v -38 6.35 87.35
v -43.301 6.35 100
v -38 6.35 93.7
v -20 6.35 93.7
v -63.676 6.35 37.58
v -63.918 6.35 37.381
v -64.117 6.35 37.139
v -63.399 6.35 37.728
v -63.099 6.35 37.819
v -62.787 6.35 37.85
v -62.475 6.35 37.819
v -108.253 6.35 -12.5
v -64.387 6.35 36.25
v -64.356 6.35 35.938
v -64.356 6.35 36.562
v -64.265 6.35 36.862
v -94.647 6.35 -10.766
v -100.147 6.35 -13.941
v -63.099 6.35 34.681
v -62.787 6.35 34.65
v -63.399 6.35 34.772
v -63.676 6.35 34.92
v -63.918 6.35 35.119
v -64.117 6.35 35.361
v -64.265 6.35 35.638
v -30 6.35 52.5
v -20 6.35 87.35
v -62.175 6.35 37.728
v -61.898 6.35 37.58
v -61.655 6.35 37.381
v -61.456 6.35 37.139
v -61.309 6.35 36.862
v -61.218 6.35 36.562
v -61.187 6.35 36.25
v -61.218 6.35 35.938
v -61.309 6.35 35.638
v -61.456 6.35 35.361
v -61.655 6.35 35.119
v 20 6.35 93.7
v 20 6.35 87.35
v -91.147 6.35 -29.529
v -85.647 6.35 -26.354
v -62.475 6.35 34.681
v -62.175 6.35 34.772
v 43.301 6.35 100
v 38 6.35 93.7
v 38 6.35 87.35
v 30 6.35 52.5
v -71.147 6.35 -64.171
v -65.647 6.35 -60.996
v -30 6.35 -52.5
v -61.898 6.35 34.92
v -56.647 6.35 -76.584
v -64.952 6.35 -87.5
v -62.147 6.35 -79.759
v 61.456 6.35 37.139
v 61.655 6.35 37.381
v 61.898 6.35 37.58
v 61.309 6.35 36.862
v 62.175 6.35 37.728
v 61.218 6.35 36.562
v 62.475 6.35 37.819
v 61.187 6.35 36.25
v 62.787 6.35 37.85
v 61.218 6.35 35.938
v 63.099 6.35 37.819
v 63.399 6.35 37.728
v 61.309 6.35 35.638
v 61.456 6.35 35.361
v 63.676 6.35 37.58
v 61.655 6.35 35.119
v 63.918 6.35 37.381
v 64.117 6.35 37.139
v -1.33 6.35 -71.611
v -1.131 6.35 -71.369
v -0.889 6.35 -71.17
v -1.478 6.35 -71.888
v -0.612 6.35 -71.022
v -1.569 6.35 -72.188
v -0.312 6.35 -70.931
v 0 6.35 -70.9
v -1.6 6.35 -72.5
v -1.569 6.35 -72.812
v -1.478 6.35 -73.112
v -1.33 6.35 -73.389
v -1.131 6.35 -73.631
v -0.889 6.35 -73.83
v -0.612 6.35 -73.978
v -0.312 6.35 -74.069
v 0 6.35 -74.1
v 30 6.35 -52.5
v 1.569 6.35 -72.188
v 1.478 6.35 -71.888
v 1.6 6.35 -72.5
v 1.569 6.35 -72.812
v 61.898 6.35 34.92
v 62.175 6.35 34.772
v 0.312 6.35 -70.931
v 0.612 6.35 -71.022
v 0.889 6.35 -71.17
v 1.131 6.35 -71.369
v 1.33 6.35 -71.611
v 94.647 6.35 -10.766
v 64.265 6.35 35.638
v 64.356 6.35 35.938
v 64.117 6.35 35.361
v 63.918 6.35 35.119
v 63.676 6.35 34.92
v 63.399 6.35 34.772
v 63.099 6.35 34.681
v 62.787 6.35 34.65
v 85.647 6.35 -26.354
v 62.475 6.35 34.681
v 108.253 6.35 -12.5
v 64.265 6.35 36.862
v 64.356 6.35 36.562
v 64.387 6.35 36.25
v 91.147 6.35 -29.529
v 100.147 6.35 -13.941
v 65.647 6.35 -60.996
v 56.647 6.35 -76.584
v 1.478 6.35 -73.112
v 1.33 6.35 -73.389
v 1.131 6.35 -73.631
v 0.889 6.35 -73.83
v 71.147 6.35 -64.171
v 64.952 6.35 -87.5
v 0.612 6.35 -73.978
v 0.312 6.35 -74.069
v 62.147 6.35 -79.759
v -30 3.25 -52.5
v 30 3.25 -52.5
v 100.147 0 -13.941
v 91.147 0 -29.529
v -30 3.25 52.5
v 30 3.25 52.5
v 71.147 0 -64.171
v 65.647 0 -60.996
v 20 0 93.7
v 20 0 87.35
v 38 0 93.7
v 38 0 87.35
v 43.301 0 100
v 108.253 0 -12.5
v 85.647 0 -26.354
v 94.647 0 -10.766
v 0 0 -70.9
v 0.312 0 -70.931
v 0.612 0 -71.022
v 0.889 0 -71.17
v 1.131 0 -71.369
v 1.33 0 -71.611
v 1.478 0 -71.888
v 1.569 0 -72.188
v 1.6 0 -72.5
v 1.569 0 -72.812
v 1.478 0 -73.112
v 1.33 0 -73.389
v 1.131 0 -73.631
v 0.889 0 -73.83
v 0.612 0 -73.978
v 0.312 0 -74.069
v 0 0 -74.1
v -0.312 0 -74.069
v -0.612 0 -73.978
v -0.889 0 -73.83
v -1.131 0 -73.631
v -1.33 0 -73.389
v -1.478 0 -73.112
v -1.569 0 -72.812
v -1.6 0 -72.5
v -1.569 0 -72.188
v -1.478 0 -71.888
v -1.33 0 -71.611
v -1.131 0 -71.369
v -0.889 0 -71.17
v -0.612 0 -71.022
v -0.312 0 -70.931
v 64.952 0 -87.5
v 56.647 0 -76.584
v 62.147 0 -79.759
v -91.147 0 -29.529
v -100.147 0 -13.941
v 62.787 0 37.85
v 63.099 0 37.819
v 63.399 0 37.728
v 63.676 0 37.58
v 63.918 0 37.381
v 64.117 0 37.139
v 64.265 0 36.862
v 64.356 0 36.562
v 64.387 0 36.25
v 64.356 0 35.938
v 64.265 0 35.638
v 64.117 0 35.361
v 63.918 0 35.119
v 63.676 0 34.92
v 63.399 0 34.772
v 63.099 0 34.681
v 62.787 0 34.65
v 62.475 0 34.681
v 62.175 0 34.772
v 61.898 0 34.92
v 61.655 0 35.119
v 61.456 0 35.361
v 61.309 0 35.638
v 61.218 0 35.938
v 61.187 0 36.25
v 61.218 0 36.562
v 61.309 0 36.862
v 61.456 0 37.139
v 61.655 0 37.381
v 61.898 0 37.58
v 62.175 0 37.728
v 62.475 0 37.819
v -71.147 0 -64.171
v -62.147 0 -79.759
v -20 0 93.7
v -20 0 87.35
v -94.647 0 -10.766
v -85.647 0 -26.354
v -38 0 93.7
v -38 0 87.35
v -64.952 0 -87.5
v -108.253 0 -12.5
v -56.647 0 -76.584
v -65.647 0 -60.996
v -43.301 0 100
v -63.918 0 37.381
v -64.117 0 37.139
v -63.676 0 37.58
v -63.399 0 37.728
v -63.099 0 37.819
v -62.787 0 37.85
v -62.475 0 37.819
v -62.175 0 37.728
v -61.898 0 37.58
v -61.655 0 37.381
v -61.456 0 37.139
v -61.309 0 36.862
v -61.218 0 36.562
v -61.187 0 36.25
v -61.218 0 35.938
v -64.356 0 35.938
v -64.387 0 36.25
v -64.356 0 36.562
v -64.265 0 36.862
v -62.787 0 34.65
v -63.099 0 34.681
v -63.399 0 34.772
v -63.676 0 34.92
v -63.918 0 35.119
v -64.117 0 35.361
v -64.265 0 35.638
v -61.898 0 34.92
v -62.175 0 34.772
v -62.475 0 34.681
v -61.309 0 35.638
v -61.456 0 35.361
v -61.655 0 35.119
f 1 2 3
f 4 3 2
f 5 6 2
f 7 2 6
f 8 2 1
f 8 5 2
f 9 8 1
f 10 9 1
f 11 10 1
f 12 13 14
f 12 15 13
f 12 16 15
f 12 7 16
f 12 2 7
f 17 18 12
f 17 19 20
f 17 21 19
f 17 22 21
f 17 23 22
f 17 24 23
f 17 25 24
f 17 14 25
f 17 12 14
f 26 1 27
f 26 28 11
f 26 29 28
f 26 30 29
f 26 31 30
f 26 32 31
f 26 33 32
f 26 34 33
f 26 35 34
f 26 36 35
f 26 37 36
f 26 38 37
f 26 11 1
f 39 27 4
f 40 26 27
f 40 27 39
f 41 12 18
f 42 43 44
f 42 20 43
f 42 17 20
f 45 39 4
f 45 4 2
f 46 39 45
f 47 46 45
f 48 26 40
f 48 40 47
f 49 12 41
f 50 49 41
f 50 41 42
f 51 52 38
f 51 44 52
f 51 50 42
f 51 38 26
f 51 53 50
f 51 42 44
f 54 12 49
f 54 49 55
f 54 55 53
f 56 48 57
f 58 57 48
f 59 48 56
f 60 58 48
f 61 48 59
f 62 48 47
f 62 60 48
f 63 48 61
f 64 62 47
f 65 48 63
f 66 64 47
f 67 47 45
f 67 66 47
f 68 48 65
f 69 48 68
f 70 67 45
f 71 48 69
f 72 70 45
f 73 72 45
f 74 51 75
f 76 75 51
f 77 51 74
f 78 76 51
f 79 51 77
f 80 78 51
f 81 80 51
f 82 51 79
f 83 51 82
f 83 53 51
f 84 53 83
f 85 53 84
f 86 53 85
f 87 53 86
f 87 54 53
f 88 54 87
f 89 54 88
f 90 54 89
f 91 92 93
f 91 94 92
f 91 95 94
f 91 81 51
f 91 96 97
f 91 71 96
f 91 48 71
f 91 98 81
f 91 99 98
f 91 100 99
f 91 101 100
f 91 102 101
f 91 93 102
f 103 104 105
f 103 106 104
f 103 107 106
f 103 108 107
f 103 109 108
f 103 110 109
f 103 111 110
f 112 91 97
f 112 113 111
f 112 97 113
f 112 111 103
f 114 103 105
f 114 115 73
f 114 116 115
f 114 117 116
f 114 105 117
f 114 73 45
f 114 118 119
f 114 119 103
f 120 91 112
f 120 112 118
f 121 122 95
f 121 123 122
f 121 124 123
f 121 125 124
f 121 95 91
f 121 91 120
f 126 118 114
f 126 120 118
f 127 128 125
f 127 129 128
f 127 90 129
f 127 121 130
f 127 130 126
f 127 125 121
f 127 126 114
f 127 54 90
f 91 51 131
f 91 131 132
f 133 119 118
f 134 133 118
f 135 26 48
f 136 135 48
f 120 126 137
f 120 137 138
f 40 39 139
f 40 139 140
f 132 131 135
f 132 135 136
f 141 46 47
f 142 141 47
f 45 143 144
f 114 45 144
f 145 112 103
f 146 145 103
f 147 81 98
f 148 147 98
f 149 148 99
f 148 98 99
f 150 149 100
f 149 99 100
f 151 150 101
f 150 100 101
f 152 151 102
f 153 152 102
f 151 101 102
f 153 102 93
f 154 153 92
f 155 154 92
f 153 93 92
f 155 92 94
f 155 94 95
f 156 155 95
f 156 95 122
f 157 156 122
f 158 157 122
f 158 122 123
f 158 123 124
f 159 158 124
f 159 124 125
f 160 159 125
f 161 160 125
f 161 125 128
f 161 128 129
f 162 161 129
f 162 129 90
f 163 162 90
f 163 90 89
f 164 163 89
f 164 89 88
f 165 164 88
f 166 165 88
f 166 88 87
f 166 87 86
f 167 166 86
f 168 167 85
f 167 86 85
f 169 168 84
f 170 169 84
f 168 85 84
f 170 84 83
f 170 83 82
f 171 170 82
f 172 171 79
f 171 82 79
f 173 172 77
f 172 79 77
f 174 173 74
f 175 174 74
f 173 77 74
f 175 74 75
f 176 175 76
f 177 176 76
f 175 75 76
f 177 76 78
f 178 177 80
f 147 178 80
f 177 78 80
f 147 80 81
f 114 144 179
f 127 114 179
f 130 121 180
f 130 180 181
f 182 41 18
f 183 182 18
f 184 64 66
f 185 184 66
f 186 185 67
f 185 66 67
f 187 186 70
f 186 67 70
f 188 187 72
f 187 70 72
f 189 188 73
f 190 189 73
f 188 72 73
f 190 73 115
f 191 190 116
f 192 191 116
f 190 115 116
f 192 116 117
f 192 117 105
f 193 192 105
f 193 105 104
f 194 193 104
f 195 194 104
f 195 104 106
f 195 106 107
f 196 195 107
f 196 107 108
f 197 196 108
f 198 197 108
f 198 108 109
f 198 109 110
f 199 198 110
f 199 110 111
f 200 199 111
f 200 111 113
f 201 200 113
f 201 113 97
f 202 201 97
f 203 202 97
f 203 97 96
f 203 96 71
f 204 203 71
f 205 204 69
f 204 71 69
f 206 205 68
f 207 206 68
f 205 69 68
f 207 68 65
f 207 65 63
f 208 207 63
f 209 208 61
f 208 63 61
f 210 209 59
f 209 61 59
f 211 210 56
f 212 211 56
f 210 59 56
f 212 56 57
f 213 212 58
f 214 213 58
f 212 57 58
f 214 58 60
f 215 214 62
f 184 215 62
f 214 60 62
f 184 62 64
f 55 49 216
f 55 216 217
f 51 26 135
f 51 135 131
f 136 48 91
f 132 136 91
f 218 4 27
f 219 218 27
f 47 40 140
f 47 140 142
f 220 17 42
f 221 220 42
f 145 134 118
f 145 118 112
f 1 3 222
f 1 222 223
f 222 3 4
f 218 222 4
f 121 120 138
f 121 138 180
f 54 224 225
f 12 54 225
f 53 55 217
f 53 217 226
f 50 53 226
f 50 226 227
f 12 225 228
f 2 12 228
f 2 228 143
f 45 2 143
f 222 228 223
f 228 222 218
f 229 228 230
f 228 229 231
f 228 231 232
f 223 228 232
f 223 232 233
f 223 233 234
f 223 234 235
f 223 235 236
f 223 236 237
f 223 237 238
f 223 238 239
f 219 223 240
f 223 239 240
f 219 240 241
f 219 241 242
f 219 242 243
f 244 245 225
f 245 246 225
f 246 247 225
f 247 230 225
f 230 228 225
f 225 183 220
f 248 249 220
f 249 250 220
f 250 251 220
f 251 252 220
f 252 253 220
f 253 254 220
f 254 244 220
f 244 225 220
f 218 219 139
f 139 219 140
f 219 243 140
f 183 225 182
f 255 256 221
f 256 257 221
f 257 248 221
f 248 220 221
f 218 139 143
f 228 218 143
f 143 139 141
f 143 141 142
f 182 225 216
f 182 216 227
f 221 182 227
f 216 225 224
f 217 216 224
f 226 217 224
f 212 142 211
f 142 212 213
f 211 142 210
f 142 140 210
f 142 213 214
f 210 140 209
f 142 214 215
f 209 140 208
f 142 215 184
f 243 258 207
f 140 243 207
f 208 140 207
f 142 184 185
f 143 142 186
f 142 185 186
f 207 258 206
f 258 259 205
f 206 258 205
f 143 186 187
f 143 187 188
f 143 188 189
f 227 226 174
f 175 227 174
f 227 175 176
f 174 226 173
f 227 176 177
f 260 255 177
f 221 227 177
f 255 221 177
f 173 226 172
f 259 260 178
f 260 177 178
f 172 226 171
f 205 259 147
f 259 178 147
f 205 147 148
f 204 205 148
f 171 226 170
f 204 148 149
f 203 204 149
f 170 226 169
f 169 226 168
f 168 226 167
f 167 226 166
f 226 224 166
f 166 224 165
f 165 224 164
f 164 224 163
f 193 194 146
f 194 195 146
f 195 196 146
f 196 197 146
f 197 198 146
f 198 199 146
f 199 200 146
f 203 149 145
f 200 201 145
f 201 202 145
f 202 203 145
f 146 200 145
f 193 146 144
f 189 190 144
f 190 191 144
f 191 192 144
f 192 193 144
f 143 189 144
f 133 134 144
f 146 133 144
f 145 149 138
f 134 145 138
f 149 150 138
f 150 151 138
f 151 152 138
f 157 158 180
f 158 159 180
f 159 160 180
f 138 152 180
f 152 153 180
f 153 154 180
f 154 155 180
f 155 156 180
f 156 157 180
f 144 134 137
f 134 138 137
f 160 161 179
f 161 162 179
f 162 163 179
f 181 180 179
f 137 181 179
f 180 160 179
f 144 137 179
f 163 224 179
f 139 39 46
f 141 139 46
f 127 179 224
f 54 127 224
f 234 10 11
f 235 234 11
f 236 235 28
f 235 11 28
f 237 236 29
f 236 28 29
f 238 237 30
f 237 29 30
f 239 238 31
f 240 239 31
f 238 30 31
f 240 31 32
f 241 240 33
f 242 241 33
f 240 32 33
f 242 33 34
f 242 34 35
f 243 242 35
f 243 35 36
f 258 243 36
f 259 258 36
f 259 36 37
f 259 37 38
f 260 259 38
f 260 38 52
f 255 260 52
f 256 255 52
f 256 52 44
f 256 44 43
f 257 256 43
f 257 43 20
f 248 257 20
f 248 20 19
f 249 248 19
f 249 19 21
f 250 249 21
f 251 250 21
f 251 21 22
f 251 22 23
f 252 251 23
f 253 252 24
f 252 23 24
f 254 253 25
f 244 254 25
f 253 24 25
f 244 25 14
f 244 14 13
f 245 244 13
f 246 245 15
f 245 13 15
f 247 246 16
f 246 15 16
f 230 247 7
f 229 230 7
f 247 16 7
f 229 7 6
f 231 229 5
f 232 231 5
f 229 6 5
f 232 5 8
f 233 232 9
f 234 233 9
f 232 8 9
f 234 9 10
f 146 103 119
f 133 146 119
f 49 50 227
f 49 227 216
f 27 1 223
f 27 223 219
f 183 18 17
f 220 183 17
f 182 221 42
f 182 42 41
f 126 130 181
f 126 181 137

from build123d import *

# Parameters (mm, degrees)
BOSS_EXTRUDE1_DEPTH = 6.35
SKETCH2_W           = 18
SKETCH2_H           = 6.35
CUT_EXTRUDE1_DEPTH  = 148.509567486
SKETCH4_W           = 60
SKETCH4_H           = 105
CUT_EXTRUDE2_DEPTH  = 3.1
SKETCH5_R           = 1.6
CUT_EXTRUDE3_DEPTH  = 148.509567486


with BuildPart() as part:
    # Sketch1 → Boss-Extrude1 (new body)
    with BuildSketch(Plane(origin=(0, 0, 0), x_dir=(1, 0, 0), z_dir=(0, 1, 0))):
        Polygon((64.951905284, 87.5), (-64.951905284, 87.5), (-108.253175473, 12.5), (-43.301270189, -100), (43.301270189, -100), (108.253175473, 12.5), align=None)
    extrude(amount=BOSS_EXTRUDE1_DEPTH)

    # Sketch2 → Cut-Extrude1 (cut, through all)
    with BuildSketch(Plane(origin=(0, 6.35, 0), x_dir=(1, 0, 0), z_dir=(0, 1, 0))):
        with Locations((-29, -90.525)):
            Rectangle(SKETCH2_W, SKETCH2_H)
        with Locations((29, -90.525)):
            Rectangle(SKETCH2_W, SKETCH2_H)
        Polygon((-62.146580335, 79.758965344), (-56.647319021, 76.583965344), (-65.647319021, 60.995508076), (-71.146580335, 64.170508076), align=None)
        Polygon((-94.647319021, 10.766034656), (-85.647319021, 26.354491924), (-91.146580335, 29.529491924), (-100.146580335, 13.941034656), align=None)
        Polygon((100.146580335, 13.941034656), (91.146580335, 29.529491924), (85.647319021, 26.354491924), (94.647319021, 10.766034656), align=None)
        Polygon((56.647319021, 76.583965344), (62.146580335, 79.758965344), (71.146580335, 64.170508076), (65.647319021, 60.995508076), align=None)
    extrude(amount=-CUT_EXTRUDE1_DEPTH, mode=Mode.SUBTRACT)

    # Sketch4 → Cut-Extrude2 (cut)
    with BuildSketch(Plane(origin=(0, 6.35, 0), x_dir=(1, 0, 0), z_dir=(0, 1, 0))):
        Rectangle(SKETCH4_W, SKETCH4_H)
    extrude(amount=-CUT_EXTRUDE2_DEPTH, mode=Mode.SUBTRACT)

    # Sketch5 → Cut-Extrude3 (cut, through all)
    with BuildSketch(Plane(origin=(0, 6.35, 0), x_dir=(1, 0, 0), z_dir=(0, 1, 0))):
        with Locations((0, 72.5)):
            Circle(SKETCH5_R)
        with Locations((-62.786841774, -36.25)):
            Circle(SKETCH5_R)
        with Locations((62.786841774, -36.25)):
            Circle(SKETCH5_R)
    extrude(amount=-CUT_EXTRUDE3_DEPTH, mode=Mode.SUBTRACT)


solid = part.part
